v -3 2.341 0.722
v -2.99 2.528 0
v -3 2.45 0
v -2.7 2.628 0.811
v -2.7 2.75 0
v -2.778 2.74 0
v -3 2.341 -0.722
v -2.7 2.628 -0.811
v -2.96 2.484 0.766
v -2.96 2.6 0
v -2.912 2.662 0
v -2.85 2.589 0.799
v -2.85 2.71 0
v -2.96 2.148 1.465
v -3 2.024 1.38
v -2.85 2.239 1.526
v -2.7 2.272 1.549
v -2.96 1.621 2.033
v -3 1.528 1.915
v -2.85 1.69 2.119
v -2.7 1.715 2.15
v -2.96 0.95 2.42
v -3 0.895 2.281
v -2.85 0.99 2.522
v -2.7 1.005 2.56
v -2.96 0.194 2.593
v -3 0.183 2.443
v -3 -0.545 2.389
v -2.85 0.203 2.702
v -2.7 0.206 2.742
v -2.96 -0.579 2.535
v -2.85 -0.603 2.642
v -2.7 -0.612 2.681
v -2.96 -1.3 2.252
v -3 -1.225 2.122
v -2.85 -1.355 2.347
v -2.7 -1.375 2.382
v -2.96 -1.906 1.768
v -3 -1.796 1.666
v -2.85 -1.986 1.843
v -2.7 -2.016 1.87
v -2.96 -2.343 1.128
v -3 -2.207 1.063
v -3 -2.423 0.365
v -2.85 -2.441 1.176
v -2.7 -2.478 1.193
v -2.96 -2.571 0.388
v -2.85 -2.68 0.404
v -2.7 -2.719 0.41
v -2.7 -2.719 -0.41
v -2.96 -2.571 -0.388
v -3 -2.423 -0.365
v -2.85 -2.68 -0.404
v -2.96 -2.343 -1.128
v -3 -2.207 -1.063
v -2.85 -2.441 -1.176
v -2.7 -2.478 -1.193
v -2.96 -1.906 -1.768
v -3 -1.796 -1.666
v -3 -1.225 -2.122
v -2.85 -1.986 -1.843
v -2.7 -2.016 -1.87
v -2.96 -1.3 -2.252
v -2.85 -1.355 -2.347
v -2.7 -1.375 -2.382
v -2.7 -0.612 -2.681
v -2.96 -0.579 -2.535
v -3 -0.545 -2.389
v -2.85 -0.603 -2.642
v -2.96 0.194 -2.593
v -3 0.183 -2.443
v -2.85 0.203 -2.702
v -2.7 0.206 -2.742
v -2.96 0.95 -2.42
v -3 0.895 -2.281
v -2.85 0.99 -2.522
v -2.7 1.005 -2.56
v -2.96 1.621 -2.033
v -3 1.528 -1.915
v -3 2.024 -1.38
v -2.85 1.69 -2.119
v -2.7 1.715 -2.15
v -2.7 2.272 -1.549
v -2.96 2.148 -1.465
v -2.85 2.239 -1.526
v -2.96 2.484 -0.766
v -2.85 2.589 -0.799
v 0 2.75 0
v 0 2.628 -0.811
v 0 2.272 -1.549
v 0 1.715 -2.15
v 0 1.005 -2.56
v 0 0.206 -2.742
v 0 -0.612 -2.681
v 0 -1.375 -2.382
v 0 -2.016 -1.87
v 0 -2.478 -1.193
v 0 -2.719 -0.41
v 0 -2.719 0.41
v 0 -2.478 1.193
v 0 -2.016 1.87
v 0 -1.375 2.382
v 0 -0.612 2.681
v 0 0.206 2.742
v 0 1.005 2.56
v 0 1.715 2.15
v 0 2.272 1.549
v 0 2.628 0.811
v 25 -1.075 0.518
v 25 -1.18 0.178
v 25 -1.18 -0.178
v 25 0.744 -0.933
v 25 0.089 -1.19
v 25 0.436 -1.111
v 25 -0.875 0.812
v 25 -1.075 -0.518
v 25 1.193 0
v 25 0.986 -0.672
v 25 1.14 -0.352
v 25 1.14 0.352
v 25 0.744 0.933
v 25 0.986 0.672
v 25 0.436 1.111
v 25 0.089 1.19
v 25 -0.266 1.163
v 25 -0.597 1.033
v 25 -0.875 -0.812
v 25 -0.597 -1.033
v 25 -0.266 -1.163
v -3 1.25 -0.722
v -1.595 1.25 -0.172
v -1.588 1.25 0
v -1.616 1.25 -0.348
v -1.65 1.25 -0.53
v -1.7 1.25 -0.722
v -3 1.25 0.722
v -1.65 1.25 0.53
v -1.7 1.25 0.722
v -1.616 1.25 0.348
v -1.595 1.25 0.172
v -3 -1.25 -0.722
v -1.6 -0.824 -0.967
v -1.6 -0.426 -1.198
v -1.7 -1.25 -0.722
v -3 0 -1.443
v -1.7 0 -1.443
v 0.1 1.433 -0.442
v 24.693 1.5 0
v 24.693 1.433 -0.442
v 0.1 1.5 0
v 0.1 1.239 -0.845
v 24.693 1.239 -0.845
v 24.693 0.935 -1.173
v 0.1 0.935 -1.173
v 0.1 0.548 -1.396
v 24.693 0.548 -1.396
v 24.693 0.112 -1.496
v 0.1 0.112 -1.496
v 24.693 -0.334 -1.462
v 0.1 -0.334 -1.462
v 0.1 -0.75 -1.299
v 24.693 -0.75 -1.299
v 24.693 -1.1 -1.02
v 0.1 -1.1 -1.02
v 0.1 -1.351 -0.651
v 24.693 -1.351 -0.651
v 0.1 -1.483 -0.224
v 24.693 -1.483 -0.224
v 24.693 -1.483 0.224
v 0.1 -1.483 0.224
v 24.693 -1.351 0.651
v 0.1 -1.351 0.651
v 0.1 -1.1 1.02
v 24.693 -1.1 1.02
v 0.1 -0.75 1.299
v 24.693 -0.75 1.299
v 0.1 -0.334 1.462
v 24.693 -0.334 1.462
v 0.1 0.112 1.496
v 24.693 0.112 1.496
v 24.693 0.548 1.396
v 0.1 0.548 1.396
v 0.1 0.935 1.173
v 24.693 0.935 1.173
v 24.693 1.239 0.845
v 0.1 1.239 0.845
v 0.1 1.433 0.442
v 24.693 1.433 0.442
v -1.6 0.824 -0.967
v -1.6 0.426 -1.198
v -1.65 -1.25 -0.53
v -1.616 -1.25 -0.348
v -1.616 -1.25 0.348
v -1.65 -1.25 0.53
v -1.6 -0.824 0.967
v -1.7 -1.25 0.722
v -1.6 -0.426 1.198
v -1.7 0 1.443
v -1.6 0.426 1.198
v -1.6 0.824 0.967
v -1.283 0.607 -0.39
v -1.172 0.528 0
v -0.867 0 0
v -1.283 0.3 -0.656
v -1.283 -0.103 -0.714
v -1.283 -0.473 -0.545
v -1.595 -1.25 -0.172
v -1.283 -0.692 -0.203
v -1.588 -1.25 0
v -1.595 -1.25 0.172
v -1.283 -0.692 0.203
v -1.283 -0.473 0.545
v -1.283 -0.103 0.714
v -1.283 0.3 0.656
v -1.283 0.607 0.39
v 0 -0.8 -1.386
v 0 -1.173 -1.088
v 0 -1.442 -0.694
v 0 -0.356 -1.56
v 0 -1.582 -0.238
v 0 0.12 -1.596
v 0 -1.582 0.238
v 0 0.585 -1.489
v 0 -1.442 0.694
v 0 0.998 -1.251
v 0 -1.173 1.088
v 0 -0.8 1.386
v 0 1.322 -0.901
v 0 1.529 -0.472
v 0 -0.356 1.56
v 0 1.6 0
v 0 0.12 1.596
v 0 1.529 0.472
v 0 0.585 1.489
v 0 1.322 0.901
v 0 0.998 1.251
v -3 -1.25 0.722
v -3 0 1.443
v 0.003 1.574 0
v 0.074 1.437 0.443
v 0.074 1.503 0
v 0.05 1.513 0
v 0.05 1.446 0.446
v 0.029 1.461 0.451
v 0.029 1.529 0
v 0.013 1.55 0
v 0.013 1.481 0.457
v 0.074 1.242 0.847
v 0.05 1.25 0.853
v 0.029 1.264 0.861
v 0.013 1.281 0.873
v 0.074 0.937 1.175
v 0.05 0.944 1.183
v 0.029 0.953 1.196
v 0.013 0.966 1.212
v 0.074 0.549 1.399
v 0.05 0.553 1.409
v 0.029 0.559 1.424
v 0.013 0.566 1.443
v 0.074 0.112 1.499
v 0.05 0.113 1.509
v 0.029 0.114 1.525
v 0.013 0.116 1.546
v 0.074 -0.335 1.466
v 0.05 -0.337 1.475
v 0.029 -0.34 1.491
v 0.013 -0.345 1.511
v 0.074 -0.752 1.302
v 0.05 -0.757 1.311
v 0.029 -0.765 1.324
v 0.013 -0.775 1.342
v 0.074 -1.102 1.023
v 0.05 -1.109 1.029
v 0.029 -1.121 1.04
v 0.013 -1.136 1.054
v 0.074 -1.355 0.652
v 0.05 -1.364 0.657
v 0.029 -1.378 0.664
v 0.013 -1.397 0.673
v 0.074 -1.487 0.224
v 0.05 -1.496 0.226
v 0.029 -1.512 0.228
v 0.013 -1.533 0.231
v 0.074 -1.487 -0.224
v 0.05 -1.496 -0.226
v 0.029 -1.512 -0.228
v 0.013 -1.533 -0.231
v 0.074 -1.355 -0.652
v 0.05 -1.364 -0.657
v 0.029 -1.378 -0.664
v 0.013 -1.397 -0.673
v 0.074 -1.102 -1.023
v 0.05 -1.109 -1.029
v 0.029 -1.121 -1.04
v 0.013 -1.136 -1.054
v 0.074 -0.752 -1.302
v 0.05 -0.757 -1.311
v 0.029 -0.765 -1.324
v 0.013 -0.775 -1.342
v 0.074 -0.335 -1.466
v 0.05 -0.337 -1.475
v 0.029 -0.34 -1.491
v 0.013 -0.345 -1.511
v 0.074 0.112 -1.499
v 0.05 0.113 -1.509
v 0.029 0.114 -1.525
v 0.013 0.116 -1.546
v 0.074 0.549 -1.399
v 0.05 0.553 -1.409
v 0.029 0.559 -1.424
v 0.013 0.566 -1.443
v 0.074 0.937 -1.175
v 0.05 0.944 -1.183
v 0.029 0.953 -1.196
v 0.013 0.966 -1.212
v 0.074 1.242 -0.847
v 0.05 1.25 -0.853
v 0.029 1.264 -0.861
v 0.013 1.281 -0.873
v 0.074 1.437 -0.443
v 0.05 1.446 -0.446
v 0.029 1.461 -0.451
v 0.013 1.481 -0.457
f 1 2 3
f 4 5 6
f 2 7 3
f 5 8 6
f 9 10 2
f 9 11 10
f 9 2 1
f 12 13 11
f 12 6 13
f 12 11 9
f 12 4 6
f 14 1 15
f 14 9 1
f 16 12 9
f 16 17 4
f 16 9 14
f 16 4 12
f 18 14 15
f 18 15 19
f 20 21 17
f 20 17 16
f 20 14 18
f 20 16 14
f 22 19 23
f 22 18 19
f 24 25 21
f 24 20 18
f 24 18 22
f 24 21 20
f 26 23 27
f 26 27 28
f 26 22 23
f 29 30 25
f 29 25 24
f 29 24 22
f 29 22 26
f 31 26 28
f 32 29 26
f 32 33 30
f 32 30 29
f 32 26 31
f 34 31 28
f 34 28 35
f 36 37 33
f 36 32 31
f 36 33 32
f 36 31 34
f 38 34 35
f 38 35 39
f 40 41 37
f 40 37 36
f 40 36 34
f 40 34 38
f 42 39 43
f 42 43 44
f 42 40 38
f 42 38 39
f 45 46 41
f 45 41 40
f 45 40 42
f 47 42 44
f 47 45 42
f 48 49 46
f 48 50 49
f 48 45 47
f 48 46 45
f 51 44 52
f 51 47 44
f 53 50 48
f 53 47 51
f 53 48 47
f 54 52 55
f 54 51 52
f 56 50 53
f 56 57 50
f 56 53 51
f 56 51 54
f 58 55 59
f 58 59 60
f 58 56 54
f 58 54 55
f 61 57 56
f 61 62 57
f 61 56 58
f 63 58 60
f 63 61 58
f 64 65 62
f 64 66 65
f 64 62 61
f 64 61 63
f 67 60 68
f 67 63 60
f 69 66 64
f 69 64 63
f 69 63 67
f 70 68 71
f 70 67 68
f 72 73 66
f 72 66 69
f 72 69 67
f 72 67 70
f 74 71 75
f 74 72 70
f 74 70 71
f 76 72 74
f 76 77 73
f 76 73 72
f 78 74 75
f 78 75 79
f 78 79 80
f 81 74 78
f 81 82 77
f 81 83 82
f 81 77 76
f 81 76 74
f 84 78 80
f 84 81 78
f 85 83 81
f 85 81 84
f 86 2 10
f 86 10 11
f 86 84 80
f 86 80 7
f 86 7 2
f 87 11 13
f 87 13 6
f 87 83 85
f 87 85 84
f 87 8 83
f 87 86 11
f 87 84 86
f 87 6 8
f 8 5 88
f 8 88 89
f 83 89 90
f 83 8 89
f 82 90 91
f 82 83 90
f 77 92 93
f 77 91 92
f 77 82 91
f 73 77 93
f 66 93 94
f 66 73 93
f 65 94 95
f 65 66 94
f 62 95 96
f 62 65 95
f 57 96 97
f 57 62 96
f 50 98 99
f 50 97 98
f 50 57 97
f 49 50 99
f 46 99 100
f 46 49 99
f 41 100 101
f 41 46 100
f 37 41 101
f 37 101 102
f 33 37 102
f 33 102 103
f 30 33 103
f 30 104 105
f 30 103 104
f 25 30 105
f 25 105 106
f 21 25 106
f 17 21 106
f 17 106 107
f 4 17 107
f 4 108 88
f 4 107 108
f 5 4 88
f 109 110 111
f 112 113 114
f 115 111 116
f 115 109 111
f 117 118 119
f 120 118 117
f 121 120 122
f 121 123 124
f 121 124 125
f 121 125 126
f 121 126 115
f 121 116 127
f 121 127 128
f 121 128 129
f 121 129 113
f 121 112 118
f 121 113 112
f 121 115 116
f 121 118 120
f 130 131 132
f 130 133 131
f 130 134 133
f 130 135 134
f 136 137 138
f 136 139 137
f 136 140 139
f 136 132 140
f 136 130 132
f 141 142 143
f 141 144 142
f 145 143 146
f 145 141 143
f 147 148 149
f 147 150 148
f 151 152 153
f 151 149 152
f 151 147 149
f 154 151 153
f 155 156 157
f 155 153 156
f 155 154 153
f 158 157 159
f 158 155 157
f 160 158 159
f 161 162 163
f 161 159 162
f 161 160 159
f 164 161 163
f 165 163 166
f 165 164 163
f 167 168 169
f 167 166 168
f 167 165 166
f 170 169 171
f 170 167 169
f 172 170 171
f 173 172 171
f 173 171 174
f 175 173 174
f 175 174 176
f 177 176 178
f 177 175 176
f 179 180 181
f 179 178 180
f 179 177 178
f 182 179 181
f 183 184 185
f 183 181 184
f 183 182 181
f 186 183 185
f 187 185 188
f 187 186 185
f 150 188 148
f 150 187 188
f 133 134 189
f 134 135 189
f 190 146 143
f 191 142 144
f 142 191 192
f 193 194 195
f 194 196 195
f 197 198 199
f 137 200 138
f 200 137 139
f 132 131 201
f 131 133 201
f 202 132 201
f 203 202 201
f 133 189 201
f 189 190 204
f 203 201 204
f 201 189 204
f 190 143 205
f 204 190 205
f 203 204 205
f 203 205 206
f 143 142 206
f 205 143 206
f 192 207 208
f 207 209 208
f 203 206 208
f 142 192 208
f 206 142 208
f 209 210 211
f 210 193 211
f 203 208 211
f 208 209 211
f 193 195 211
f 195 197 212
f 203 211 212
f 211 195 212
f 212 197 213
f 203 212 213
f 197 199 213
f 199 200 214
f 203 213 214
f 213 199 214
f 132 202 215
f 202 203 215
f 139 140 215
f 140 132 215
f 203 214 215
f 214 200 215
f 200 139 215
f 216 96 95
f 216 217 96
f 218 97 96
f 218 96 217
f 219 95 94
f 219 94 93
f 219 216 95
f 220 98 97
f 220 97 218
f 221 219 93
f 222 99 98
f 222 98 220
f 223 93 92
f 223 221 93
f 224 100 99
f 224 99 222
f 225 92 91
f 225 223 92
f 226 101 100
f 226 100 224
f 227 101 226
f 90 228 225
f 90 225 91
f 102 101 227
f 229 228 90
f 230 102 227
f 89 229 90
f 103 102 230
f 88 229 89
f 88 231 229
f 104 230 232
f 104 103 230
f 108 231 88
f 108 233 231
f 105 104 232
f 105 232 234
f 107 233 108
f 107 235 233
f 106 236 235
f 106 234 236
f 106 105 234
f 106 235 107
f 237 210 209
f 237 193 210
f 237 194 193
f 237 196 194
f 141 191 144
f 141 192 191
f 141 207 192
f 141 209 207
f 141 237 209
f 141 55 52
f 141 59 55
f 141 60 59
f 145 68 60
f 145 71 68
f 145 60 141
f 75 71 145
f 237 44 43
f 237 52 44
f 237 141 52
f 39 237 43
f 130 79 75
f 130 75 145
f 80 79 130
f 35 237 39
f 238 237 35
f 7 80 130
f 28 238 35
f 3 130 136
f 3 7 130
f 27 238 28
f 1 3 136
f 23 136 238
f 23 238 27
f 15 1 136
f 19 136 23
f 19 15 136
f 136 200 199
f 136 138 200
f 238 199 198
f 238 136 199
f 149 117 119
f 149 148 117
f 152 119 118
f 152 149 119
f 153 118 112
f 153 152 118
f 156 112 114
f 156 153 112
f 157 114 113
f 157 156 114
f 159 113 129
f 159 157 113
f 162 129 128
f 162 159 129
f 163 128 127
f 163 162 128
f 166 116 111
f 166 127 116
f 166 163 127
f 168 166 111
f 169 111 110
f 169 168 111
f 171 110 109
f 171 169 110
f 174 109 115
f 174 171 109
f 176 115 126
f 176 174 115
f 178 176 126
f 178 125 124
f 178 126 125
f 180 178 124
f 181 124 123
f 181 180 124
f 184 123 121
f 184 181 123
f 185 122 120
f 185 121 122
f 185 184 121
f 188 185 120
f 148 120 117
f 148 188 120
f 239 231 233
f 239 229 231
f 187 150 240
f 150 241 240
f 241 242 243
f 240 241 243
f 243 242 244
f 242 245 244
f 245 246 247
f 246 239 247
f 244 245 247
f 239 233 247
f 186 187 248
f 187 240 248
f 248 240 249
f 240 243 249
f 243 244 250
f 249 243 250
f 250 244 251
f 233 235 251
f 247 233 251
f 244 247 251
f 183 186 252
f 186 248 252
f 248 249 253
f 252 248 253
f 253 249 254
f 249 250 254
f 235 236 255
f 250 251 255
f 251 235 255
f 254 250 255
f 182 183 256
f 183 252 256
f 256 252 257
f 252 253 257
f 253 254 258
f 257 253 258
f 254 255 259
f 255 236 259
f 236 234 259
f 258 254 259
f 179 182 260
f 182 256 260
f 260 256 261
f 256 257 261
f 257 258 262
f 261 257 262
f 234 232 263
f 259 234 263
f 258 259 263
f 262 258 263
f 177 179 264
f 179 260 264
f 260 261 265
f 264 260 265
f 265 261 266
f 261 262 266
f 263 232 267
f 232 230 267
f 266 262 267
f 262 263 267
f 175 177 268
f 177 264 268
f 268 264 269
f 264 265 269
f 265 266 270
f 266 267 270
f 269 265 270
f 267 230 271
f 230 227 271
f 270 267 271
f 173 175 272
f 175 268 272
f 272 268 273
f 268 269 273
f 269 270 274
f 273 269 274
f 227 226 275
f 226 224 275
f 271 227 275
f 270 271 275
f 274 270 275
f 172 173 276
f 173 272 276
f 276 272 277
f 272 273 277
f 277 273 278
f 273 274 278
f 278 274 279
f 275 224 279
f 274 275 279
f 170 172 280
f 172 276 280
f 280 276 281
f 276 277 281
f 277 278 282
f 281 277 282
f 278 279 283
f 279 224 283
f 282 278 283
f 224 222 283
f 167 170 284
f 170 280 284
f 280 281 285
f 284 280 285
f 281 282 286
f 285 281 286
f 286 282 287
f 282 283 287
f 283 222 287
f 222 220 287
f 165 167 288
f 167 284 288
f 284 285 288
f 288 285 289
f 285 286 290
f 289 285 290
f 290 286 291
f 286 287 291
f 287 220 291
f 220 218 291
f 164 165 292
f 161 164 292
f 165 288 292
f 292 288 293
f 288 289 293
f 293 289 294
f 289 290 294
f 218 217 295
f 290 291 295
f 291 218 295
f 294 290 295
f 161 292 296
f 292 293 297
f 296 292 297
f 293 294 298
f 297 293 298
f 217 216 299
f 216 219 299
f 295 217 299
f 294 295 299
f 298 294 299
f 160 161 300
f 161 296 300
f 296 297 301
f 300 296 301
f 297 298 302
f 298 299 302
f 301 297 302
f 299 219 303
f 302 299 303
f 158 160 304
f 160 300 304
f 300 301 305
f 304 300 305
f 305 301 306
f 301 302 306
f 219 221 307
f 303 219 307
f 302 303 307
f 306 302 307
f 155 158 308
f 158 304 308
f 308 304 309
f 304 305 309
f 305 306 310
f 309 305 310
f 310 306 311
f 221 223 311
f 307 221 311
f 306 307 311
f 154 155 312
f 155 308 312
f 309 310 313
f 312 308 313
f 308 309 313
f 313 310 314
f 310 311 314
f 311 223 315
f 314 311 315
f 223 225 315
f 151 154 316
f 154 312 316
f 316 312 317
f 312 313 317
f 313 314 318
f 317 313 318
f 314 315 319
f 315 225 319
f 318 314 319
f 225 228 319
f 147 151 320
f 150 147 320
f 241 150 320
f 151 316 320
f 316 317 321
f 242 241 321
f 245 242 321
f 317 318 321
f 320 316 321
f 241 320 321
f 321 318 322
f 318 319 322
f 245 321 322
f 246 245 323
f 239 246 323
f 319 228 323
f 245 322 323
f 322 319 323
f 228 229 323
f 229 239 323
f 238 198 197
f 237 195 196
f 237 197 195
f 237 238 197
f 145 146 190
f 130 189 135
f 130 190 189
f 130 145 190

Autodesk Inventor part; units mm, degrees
ref_plane "YZ Plane" through (0, 0, 0) normal (1, 0, 0) x (0, 1, 0)
ref_plane "XZ Plane" through (0, 0, 0) normal (0, 1, 0) x (-1, 0, 0)
sketch "Sketch1" plane through (0, 0, 0) normal (0, 0, 1) x (1, 0, 0)
  line L0 (-0.8667, 0) -> (25, 0)
  line L1 (25, 0) -> (25, 1.5)
  line L2 (25, 1.5) -> (18.25, 1.5)
  line L3 (18.25, 1.5) -> (17.9432, 1.5)
  line L4 (17.9432, 1.5) -> (0, 1.5)
  line L5 (0, 1.5) -> (0, 2.75)
  line L6 (0, 2.75) -> (-3, 2.75)
  line L7 (-3, 2.75) -> (-3, 1.4434)
  line L8 (-3, 1.4434) -> (-1.7, 1.4434)
  line L9 (-1.7, 1.4434) -> (-0.8667, 0)
  line L10 (-8.6, 0) -> (30.6, 0) projected
  line L11 (0, -0.55) -> (0, 3.3) projected
  line L12 (18.25, 1.5) -> (0, 1.5) construction
  dimension "d1" = 6.75
  dimension "d2" = 0.3068
  dimension "d3" = 3
  dimension "d4" = 1.3
  dimension "d5" = 60
  dimension "d6" = 3
  dimension "d7" = 3
  dimension "d8" = 2.8868
  dimension "d9" = 5.5
  dimension "d26" = 25
revolve "Body" add sketch "Sketch1" angle 360 about axis through (-0.8667, 0, 0) along (1, 0, 0)
sketch "Sketch2" plane through (-3, 0, 0) normal (-1, 0, 0) x (0, 0, 1)
  circle A0 centre (0, 0) radius 1.4434 projected
  line L0 (0, -3.85) -> (0, 3.85) projected
  line L1 (-3.85, 0) -> (3.85, 0) projected
  line L2 (1.4434, 0) -> (0.7217, -1.25)
  line L3 (0.7217, -1.25) -> (-0.7217, -1.25)
  line L4 (-0.7217, -1.25) -> (-1.4434, 0)
  line L5 (-1.4434, 0) -> (-0.7217, 1.25)
  line L6 (-0.7217, 1.25) -> (0.7217, 1.25)
  line L7 (0.7217, 1.25) -> (1.4434, 0)
extrude "Slot" add sketch "Sketch2" against normal up to next contours L7 A0 | A0 L2 | L6 L0 A0 | A0 L0 L3 | L0 L6 A0 | A0 L3 L0 | L4 A0 | A0 L5
fillet "Fillet1" radius 0.3 1 edges at (-3, -2.75, 0)
thread "Thread" size "M3x0.5" class "6g" standard "ISO Metric profile" length 6.75
chamfer "Chamfer1" distance 0.3067 distance2 0.3067 1 edges at (25, -1.5, 0) measured on face at (25, 0.2885, 0.9187)
ref_plane "Work Plane1" through (29, 0, 0) normal (0, -1, 0) x (1, 0, 0)
fillet "Fillet2" radius 0.1 1 edges at (0, -1.5, 0)
equation "\"d1\" = GEL"
equation "\"d3\" = KOH"
equation "\"d4\" = INTI"
equation "\"d6\" = GD"
equation "\"d7\" = BDM"
equation "\"d8\" = 1.1547 * SW"
equation "\"d9\" = KOD"
equation "\"d17\" = RR"
equation "\"d13\" = GEL"
equation "\"d15\" = -0.5 * SPD + 0.5 * GD"
equation "\"d16\" = GUL"
equation "\"d30\" = R"
equation "\"GD\" = NND"
equation "\"NLG\" = 8"
equation "\"GEL\" = 6.75"
equation "\"KOD\" = 5.5"
equation "\"KOH\" = NND"
equation "\"INTI\" = 1.3"
equation "\"GAL\" = 0.61345 * PTC"
equation "\"GUL\" = 0.61345 * PTC"
equation "\"BDM\" = NND"
equation "\"SW\" = 2.5"
equation "\"RR\" = 0.1 * NND"
equation "\"SPD\" = NND - 1.2269 * PTC"
equation "\"R\" = 0.1"
equation "\"PHH\" = 0.13"
equation "\"GD1\" = THREADDIA - 1.2269 * PTC"
equation "\"THREADDIA\" = 3"
equation "\"FAWI\" = 45deg"
equation "\"PTC\" = 0.5"
equation "\"KOH1\" = 2.7"
equation "\"NND\" = 3"
equation "\"TOA\" = 30deg"
equation "\"E0\" = 1.155 * SW"
properties part number "AS 1420 - 1973 - M3 x 8" material "Steel, Mild"
